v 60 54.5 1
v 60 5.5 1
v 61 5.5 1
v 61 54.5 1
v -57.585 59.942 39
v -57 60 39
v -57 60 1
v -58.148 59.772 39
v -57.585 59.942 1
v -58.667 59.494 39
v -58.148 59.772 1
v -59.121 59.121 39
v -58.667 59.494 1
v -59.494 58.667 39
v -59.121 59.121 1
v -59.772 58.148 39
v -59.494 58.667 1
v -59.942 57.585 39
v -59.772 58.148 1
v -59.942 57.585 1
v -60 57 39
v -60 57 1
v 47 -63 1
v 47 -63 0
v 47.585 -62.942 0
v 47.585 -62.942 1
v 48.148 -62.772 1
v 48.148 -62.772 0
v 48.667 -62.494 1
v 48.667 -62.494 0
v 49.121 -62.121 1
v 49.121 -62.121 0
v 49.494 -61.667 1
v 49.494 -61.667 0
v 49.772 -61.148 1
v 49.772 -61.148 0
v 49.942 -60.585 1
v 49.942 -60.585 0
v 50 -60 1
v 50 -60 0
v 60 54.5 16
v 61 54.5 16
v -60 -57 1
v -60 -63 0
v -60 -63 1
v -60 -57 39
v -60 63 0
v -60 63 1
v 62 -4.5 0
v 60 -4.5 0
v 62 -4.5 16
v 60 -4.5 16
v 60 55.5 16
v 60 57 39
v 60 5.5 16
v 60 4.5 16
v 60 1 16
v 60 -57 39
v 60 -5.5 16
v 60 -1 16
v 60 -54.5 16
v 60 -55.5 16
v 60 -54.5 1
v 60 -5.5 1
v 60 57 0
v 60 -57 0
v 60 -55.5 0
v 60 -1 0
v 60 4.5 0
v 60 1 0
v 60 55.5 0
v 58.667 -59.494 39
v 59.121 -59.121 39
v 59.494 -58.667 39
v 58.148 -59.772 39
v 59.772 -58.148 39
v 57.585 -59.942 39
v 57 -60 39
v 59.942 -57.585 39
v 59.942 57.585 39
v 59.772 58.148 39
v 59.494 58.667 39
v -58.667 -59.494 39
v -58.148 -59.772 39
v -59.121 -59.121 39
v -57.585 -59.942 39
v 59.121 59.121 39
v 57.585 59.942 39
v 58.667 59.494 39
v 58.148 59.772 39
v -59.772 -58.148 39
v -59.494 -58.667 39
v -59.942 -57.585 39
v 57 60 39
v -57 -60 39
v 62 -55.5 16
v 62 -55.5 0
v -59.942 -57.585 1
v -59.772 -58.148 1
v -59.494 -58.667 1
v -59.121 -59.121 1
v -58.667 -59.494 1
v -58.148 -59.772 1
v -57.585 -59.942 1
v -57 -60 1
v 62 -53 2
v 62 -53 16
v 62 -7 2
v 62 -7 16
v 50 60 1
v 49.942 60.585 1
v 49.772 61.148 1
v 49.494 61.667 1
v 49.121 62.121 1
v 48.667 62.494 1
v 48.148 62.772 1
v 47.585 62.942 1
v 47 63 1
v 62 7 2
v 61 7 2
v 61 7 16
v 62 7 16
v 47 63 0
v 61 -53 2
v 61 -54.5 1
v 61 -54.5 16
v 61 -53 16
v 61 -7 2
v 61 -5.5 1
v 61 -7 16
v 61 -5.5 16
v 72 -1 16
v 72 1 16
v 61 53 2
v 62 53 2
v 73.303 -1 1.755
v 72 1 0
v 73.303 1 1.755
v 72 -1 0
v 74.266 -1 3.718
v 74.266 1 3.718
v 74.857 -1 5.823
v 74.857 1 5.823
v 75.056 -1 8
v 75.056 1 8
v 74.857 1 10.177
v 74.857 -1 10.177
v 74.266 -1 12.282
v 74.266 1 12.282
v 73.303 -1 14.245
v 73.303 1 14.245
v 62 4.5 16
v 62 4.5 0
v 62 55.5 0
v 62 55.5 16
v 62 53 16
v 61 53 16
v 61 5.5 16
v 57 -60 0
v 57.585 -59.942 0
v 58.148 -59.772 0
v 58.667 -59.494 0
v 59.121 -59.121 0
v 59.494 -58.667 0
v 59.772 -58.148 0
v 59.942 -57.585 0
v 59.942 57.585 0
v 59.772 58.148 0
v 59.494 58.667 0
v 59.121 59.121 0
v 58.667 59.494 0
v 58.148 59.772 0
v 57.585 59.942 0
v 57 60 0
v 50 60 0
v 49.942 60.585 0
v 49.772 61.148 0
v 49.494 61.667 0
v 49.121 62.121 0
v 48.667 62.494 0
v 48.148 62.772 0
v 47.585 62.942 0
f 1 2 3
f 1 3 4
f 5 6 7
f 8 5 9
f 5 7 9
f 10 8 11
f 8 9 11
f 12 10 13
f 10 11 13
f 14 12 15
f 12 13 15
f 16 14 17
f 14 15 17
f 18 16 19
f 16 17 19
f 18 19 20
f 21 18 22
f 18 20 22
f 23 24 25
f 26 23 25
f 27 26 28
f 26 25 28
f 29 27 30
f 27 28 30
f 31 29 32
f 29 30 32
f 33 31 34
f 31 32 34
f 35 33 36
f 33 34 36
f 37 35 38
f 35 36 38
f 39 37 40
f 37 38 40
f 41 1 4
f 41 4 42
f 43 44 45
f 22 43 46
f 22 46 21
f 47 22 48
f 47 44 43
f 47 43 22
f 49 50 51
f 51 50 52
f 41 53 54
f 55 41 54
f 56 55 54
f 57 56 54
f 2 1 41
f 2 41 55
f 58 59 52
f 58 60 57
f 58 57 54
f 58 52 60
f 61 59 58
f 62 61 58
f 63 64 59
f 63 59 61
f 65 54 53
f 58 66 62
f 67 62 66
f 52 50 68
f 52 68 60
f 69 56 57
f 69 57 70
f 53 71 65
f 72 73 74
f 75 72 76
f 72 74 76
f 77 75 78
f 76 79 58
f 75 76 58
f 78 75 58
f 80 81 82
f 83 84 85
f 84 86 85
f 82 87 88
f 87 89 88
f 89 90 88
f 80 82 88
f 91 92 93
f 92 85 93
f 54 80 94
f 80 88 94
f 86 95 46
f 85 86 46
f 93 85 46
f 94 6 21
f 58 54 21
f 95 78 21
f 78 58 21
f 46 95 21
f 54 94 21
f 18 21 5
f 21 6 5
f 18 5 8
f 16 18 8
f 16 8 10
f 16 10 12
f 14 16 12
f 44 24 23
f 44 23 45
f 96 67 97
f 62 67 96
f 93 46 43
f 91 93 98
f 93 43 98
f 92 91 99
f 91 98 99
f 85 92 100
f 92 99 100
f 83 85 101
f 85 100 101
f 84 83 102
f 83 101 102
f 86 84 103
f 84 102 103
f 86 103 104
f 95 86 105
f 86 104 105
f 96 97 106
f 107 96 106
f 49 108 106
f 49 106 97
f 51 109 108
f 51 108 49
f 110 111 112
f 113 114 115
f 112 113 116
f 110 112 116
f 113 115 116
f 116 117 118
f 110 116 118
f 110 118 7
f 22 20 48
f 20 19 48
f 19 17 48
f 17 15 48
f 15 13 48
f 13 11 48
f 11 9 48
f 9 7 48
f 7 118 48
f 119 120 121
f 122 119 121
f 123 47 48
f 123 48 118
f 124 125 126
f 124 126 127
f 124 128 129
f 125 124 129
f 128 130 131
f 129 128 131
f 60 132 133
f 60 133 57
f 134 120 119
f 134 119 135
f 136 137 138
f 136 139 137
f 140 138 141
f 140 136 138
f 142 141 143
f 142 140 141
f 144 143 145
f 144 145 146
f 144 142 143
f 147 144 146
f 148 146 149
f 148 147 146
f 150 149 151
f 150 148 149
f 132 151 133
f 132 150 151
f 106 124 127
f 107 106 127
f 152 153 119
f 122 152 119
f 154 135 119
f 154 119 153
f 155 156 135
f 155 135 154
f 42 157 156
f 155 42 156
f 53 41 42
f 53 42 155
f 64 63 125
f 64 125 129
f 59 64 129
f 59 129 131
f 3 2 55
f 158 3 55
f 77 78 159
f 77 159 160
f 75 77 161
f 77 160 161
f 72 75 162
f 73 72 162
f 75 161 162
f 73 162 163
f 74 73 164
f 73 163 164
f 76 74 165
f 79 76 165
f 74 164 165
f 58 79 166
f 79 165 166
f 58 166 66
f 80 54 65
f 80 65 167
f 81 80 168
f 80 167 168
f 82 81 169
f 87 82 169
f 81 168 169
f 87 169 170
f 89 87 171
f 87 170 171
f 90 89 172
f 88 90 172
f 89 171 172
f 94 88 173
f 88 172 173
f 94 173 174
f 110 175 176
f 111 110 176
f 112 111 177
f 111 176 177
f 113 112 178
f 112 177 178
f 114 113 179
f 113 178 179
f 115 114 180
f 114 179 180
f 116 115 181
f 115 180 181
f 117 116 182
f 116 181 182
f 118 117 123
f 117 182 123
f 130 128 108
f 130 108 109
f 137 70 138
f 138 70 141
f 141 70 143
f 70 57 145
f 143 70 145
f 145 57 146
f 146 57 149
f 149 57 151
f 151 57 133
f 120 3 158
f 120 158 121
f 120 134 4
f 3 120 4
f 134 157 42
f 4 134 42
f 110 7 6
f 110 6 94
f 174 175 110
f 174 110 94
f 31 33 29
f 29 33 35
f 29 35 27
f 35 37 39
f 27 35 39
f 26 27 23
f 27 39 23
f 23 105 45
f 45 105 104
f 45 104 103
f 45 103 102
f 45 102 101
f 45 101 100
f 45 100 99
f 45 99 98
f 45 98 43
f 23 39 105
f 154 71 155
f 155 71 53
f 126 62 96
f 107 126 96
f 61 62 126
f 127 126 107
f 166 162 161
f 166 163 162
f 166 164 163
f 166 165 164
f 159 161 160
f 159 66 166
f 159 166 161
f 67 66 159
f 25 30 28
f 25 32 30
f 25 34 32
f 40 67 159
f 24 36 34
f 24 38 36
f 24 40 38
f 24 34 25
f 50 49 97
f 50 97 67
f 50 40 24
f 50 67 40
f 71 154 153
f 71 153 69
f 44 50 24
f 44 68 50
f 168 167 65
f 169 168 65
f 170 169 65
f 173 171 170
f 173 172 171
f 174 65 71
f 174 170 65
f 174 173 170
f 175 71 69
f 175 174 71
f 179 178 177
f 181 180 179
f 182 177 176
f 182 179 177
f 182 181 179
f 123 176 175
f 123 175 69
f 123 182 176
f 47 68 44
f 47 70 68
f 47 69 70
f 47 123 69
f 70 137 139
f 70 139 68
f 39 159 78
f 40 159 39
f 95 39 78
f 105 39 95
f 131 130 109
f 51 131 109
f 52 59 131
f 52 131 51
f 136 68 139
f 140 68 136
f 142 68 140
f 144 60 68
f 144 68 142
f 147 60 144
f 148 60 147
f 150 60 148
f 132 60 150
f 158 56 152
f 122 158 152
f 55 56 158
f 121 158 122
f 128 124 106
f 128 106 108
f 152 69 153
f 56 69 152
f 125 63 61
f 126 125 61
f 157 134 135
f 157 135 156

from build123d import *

# Parameters (mm, degrees)
PAD_DEPTH       = 39
PAD001_DEPTH    = 1
SKETCH002_W     = 51
SKETCH002_H     = 16
PAD002_DEPTH    = 2
SKETCH003_W     = 46
SKETCH003_H     = 14
POCKET_DEPTH    = 3
SKETCH004_W     = 49
SKETCH004_H     = 15
POCKET001_DEPTH = 1
PAD003_DEPTH    = 1


with BuildPart() as part:
    # Sketch → Pad (new body)
    with BuildSketch(Plane.XY):
        with BuildLine():
            Line((-57, 60), (57, 60))
            ThreePointArc((60, 57), (59.12132, 59.12132), (57, 60))
            Line((60, 57), (60, -57))
            ThreePointArc((57, -60), (59.12132, -59.12132), (60, -57))
            Line((57, -60), (-57, -60))
            ThreePointArc((-60, -57), (-59.12132, -59.12132), (-57, -60))
            Line((-60, -57), (-60, 57))
            ThreePointArc((-57, 60), (-59.12132, 59.12132), (-60, 57))
        make_face()
    extrude(amount=PAD_DEPTH)

    # Sketch001 → Pad001 (join)
    with BuildSketch(Plane.XY):
        with BuildLine():
            Line((-60, 63), (47, 63))
            ThreePointArc((50, 60), (49.12132, 62.12132), (47, 63))
            Line((50, 60), (50, -60))
            ThreePointArc((47, -63), (49.12132, -62.12132), (50, -60))
            Line((47, -63), (-60, -63))
            Line((-60, -63), (-60, 63))
        make_face()
    extrude(amount=PAD001_DEPTH)

    # Sketch002 (on Face19 of Pad001) → Pad002 (join)
    with BuildSketch(Plane.YZ.offset(60)):
        with Locations((-30, 8)):
            Rectangle(SKETCH002_W, SKETCH002_H)
        with Locations((30, 8)):
            Rectangle(SKETCH002_W, SKETCH002_H)
    extrude(amount=PAD002_DEPTH)

    # Sketch003 (on DatumPlane) → Pocket (cut)
    with BuildSketch(Plane.YZ.offset(60)):
        with Locations((-30, 9)):
            Rectangle(SKETCH003_W, SKETCH003_H)
        with Locations((30, 9)):
            Rectangle(SKETCH003_W, SKETCH003_H)
    extrude(amount=POCKET_DEPTH, mode=Mode.SUBTRACT)

    # Sketch004 (on DatumPlane) → Pocket001 (cut)
    with BuildSketch(Plane.YZ.offset(60)):
        with Locations((-30, 8.5)):
            Rectangle(SKETCH004_W, SKETCH004_H)
        with Locations((30, 8.5)):
            Rectangle(SKETCH004_W, SKETCH004_H)
    extrude(amount=POCKET001_DEPTH, mode=Mode.SUBTRACT)

    # Sketch005 → Pad003 (join, symmetric)
    with BuildSketch(Plane.XZ):
        with BuildLine():
            ThreePointArc((72, 0), (75.055728, 8), (72, 16))
            Line((72, 16), (60, 16))
            Line((60, 16), (60, 0))
            Line((60, 0), (72, 0))
        make_face()
    extrude(amount=PAD003_DEPTH, both=True)


solid = part.part
